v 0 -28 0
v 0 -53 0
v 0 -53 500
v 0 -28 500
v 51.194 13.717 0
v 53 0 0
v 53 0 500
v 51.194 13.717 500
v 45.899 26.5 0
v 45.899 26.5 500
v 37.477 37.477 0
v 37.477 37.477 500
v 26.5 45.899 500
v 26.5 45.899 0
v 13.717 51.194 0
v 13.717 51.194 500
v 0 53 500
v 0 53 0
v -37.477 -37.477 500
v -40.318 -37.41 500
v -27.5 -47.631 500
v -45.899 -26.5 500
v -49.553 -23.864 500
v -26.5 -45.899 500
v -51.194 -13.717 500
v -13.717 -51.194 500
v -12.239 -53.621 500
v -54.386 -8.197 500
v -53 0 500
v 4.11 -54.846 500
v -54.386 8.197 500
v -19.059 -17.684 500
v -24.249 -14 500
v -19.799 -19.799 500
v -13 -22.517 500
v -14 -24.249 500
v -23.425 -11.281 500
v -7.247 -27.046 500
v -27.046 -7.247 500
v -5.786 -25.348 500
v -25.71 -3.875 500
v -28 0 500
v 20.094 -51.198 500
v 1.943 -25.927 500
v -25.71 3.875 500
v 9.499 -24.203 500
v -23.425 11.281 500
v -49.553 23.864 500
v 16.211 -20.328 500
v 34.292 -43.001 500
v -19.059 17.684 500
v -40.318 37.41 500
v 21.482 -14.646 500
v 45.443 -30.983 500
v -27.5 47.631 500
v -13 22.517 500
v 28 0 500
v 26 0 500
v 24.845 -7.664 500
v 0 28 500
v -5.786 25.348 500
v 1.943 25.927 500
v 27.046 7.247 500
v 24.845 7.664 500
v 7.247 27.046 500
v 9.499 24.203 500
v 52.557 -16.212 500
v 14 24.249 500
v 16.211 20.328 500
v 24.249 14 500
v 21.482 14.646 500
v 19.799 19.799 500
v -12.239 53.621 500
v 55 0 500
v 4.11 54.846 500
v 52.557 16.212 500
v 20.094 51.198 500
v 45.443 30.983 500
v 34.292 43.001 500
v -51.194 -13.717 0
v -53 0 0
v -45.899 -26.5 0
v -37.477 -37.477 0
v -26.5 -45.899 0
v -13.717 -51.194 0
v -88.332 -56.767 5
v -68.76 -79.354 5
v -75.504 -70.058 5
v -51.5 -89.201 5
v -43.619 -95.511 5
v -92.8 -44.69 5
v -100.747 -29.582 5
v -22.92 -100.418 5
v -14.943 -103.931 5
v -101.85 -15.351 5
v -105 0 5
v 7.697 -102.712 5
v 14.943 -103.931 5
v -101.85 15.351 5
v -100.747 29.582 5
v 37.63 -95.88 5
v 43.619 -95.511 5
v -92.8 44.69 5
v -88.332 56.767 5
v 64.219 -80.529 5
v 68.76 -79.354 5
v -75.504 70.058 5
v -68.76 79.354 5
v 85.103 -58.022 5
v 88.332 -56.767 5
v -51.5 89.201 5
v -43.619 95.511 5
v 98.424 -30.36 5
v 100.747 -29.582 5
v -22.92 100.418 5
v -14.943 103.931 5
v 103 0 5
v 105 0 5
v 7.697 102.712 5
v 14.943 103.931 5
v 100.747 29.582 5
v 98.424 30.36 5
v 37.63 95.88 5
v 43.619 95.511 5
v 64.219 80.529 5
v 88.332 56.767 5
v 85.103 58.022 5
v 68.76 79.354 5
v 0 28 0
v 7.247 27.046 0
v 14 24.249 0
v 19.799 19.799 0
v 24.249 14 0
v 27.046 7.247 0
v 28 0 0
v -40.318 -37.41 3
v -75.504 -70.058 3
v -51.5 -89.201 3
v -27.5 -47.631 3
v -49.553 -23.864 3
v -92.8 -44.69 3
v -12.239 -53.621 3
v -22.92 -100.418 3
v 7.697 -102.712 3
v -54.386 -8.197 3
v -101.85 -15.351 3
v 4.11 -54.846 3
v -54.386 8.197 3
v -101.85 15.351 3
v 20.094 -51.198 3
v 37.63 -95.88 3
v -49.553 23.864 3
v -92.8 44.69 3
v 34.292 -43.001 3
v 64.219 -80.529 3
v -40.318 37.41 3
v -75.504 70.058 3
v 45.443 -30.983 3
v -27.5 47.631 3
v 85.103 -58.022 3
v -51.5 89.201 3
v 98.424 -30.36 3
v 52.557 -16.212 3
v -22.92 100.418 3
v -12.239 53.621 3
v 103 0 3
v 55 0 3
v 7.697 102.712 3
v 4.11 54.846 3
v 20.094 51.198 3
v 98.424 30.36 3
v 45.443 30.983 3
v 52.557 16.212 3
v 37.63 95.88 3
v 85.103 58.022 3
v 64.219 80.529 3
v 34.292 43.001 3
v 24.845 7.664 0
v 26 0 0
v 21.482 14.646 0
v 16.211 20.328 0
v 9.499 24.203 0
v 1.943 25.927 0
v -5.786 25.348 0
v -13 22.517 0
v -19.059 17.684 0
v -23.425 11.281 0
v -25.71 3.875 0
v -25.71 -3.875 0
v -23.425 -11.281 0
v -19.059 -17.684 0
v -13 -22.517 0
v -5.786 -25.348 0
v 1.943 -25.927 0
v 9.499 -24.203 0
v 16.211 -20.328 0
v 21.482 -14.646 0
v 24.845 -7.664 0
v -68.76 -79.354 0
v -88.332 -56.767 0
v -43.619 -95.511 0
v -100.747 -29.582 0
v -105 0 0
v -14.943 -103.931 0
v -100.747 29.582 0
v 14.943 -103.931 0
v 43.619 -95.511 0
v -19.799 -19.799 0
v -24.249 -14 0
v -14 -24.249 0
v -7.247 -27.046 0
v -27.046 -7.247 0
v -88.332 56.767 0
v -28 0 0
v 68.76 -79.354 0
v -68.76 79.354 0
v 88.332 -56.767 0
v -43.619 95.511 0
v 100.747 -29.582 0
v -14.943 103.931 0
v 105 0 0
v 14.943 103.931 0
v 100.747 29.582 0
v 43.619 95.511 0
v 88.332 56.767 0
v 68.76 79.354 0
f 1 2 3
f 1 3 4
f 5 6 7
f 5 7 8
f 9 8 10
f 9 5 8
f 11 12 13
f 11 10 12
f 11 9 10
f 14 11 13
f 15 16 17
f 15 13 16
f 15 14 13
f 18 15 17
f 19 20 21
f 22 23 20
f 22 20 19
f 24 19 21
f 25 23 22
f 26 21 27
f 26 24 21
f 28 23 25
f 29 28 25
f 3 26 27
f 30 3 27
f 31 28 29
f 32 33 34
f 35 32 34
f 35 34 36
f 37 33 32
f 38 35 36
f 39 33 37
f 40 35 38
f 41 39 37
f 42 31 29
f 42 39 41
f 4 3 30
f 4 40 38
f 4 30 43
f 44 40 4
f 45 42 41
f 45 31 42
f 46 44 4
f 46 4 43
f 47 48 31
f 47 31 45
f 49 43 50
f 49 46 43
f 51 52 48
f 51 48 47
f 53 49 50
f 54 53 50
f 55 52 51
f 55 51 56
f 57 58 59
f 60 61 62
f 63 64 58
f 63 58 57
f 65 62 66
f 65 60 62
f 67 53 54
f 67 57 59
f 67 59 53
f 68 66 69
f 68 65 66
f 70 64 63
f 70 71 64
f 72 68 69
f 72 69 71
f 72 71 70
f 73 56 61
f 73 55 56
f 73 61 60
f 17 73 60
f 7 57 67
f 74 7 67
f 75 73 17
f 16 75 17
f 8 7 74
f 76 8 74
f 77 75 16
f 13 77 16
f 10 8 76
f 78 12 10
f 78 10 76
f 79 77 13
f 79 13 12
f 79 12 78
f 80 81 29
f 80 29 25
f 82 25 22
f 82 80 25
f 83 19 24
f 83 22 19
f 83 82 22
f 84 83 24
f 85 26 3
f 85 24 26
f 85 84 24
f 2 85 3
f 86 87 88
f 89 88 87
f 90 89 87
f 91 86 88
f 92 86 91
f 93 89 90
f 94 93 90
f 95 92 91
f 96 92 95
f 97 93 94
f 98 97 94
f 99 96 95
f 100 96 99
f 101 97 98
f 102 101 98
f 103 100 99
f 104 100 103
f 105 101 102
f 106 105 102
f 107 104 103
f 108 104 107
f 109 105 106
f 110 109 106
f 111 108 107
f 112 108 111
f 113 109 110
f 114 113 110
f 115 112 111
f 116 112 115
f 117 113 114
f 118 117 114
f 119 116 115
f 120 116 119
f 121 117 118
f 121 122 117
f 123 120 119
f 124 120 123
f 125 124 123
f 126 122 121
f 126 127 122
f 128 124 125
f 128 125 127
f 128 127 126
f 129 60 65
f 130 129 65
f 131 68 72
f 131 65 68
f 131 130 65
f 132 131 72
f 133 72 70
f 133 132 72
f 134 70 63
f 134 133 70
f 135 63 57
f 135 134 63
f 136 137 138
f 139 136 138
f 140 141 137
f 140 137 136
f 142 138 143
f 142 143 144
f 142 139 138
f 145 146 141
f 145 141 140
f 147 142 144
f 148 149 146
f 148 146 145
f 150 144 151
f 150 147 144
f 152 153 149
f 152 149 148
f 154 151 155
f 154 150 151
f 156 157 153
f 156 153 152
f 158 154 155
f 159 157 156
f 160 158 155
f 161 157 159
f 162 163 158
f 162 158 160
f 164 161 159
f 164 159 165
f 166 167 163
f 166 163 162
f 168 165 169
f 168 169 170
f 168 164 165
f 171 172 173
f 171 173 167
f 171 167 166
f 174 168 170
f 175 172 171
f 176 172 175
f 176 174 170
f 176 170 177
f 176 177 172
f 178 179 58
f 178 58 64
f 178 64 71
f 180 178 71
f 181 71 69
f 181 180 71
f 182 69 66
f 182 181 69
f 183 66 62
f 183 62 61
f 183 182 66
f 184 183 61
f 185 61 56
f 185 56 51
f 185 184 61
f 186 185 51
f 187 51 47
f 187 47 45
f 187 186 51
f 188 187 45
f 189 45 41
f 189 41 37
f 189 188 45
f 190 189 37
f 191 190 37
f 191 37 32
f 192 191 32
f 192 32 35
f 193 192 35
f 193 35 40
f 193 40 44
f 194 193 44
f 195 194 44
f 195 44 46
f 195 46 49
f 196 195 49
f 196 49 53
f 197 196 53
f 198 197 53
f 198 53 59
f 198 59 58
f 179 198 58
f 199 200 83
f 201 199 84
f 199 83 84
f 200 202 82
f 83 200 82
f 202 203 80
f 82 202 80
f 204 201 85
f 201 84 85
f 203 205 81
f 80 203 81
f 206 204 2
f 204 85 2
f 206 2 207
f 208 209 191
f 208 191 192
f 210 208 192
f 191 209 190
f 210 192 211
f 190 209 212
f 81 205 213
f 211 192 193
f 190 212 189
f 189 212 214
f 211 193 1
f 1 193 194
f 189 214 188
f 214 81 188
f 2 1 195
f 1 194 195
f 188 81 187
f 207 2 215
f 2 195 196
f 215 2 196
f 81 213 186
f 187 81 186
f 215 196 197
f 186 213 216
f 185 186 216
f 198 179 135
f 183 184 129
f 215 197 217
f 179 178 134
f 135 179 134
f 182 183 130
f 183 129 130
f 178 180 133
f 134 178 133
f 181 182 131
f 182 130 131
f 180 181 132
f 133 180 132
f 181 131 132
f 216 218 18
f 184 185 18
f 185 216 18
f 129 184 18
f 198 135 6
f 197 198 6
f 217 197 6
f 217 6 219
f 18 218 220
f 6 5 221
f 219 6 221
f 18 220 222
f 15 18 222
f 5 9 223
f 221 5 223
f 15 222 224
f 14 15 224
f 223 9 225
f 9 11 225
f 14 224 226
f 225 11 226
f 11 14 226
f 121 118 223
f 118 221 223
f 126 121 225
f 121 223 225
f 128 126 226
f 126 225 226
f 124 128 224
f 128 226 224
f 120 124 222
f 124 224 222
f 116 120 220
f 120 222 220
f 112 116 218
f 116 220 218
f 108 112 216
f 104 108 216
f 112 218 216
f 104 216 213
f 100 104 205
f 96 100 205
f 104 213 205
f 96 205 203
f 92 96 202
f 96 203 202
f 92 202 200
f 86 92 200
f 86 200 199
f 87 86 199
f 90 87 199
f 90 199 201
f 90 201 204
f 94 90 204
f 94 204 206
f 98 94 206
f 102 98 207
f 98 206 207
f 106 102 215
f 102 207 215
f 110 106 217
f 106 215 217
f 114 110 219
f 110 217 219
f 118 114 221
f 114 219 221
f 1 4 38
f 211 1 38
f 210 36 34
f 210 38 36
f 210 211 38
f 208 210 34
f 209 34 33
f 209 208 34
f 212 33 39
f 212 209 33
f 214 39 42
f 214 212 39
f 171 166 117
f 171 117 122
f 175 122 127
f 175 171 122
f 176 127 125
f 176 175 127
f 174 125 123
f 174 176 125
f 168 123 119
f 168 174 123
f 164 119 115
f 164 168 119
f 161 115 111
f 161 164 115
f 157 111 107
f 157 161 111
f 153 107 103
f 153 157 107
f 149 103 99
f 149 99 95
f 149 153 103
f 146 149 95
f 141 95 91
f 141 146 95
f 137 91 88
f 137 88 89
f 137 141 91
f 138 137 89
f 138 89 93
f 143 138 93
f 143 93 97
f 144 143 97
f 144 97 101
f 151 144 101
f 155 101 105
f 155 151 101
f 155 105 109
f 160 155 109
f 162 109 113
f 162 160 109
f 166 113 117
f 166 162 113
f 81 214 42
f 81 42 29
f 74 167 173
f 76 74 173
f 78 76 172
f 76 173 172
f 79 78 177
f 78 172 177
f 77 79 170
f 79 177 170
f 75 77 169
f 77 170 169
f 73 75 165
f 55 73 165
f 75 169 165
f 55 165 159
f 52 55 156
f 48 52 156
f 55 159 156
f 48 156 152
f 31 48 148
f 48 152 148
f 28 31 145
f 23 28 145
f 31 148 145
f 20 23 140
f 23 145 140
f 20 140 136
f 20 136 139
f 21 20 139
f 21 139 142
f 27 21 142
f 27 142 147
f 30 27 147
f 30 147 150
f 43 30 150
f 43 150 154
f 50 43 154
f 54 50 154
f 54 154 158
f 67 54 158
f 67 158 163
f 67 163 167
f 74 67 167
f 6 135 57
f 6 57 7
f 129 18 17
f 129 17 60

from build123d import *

# Parameters (mm, degrees)
F0_R     = 105
F0_R_2   = 55
F0_R_3   = 26
F1_DEPTH = 3
F2_DEPTH = 500
F3_DEPTH = 500
F4_R     = 105
F4_R_2   = 103
F5_DEPTH = 2
F6_DEPTH = 500
F7_DEPTH = 25


# Not quite as in the source:
# - after a boolean that leaves OpenCascade's solid faulty, fix() repairs it


with BuildPart() as f1:
    # F0 (on Top) → F1 (new body)
    with BuildSketch(Plane.XY):
        Circle(F0_R)
        Circle(F0_R_2, mode=Mode.SUBTRACT)
        Circle(F0_R_2)
        with BuildLine():
            ThreePointArc((0, 53), (37.4766594029, 37.4766594029), (53, 0))
            ThreePointArc((53, 0), (37.4766594029, -37.4766594029), (0, -53))
            ThreePointArc((0, -53), (-37.4766594029, -37.4766594029), (-53, 0))
            ThreePointArc((-53, 0), (-37.4766594029, 37.4766594029), (0, 53))
        make_face(mode=Mode.SUBTRACT)
        with BuildLine():
            ThreePointArc((0, 28), (19.7989898732, 19.7989898732), (28, 0))
            Line((28, 0), (53, 0))
            ThreePointArc((53, 0), (37.4766594029, 37.4766594029), (0, 53))
            Line((0, 53), (0, 28))
        make_face()
        with BuildLine():
            ThreePointArc((-28, 0), (-19.7989898732, 19.7989898732), (0, 28))
            Line((0, 28), (0, 53))
            ThreePointArc((0, 53), (-37.4766594029, 37.4766594029), (-53, 0))
            Line((-53, 0), (-28, 0))
        make_face()
        with BuildLine():
            Line((0, -53), (0, -28))
            ThreePointArc((0, -28), (-19.7989898732, -19.7989898732), (-28, 0))
            Line((-28, 0), (-53, 0))
            ThreePointArc((-53, 0), (-37.4766594029, -37.4766594029), (0, -53))
        make_face()
        with BuildLine():
            Line((53, 0), (28, 0))
            ThreePointArc((28, 0), (19.7989898732, -19.7989898732), (0, -28))
            Line((0, -28), (0, -53))
            ThreePointArc((0, -53), (37.4766594029, -37.4766594029), (53, 0))
        make_face()
        with BuildLine():
            ThreePointArc((0, -28), (19.7989898732, -19.7989898732), (28, 0))
            ThreePointArc((28, 0), (19.7989898732, 19.7989898732), (0, 28))
            ThreePointArc((0, 28), (-19.7989898732, 19.7989898732), (-28, 0))
            ThreePointArc((-28, 0), (-19.7989898732, -19.7989898732), (0, -28))
        make_face()
        Circle(F0_R_3, mode=Mode.SUBTRACT)
    extrude(amount=F1_DEPTH)

    # F0 (on Top) → F2 (join)
    with BuildSketch(Plane.XY):
        with BuildLine():
            ThreePointArc((0, -28), (19.7989898732, -19.7989898732), (28, 0))
            ThreePointArc((28, 0), (19.7989898732, 19.7989898732), (0, 28))
            ThreePointArc((0, 28), (-19.7989898732, 19.7989898732), (-28, 0))
            ThreePointArc((-28, 0), (-19.7989898732, -19.7989898732), (0, -28))
        make_face()
        Circle(F0_R_3, mode=Mode.SUBTRACT)
    extrude(amount=F2_DEPTH)

    # F0 (on Top) → F3 (join)
    with BuildSketch(Plane.XY):
        Circle(F0_R_2)
        with BuildLine():
            ThreePointArc((0, 53), (37.4766594029, 37.4766594029), (53, 0))
            ThreePointArc((53, 0), (37.4766594029, -37.4766594029), (0, -53))
            ThreePointArc((0, -53), (-37.4766594029, -37.4766594029), (-53, 0))
            ThreePointArc((-53, 0), (-37.4766594029, 37.4766594029), (0, 53))
        make_face(mode=Mode.SUBTRACT)
    extrude(amount=F3_DEPTH)

    # F4 (on face) → F5 (join)
    with BuildSketch(Plane.XY.offset(3)):
        Circle(F4_R)
        Circle(F4_R_2, mode=Mode.SUBTRACT)
    extrude(amount=F5_DEPTH)

    # F0 (on Top) → F6 (join)
    with BuildSketch(Plane.XY):
        with BuildLine():
            ThreePointArc((-28, 0), (-19.7989898732, 19.7989898732), (0, 28))
            Line((0, 28), (0, 53))
            ThreePointArc((0, 53), (-37.4766594029, 37.4766594029), (-53, 0))
            Line((-53, 0), (-28, 0))
        make_face()
        with BuildLine():
            Line((53, 0), (28, 0))
            ThreePointArc((28, 0), (19.7989898732, -19.7989898732), (0, -28))
            Line((0, -28), (0, -53))
            ThreePointArc((0, -53), (37.4766594029, -37.4766594029), (53, 0))
        make_face()
    extrude(amount=F6_DEPTH)

    # F0 (on Top) → F7 (cut)
    with BuildSketch(Plane.XY):
        with BuildLine():
            Line((0, -53), (0, -28))
            ThreePointArc((0, -28), (-19.7989898732, -19.7989898732), (-28, 0))
            Line((-28, 0), (-53, 0))
            ThreePointArc((-53, 0), (-37.4766594029, -37.4766594029), (0, -53))
        make_face()
        with BuildLine():
            ThreePointArc((0, 28), (19.7989898732, 19.7989898732), (28, 0))
            Line((28, 0), (53, 0))
            ThreePointArc((53, 0), (37.4766594029, 37.4766594029), (0, 53))
            Line((0, 53), (0, 28))
        make_face()
    extrude(amount=F7_DEPTH, mode=Mode.SUBTRACT)

    add(f1.part.fix(), mode=Mode.REPLACE)


solid = f1.part
